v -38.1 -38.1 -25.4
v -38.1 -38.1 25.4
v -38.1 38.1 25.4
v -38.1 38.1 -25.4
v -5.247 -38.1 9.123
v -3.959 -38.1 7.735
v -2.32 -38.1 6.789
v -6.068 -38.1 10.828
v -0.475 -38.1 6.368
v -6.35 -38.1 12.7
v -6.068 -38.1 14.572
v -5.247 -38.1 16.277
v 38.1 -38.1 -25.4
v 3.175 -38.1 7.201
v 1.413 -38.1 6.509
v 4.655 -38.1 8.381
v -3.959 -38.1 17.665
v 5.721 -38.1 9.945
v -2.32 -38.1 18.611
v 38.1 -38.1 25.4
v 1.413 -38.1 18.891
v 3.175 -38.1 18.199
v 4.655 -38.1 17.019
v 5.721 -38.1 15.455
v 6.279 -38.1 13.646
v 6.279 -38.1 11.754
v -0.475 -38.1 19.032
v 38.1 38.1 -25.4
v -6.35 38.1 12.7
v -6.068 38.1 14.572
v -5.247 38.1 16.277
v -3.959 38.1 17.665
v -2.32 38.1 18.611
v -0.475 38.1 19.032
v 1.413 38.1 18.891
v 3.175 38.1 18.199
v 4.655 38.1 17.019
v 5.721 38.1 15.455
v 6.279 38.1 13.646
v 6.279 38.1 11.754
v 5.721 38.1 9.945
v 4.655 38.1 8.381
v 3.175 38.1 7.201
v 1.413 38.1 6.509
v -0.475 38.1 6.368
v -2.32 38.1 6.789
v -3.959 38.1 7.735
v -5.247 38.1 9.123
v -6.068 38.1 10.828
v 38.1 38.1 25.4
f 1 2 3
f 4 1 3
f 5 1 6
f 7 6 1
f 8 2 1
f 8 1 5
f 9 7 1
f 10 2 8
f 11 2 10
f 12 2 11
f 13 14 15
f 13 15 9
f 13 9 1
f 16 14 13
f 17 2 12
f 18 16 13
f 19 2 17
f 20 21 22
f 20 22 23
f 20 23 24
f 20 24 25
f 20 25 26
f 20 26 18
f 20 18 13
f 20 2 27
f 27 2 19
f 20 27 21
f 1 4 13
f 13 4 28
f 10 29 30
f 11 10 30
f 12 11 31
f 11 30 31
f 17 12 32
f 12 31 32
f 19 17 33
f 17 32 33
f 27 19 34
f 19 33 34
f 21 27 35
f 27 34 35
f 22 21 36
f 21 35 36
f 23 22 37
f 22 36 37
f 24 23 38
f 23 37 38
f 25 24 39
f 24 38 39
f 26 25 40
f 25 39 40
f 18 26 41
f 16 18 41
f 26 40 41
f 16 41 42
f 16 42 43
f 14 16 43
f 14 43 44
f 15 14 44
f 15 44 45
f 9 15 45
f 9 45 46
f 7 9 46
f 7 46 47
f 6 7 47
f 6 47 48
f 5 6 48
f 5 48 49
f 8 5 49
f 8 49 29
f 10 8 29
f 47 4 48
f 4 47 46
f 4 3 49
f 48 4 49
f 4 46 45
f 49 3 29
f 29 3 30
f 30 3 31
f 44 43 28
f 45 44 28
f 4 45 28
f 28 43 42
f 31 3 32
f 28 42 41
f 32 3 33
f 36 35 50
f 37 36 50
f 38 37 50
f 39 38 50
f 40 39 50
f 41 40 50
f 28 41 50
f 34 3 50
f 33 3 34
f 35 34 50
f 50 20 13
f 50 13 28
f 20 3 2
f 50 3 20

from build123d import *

# Parameters (mm, degrees)
F0_W     = 76.2
F0_H     = 76.2
F1_DEPTH = 25.4
F2_R     = 6.35
F3_DEPTH = 76.201


with BuildPart() as f1:
    # F0 (on Top) → F1 (new body, symmetric)
    with BuildSketch(Plane.XY):
        Rectangle(F0_W, F0_H)
    extrude(amount=F1_DEPTH, both=True)

    # F2 (on face) → F3 (cut, through all)
    with BuildSketch(Plane(origin=(0, 38.1, 0), x_dir=(-1, 0, 0), z_dir=(0, 1, 0))):
        with Locations((0, 12.7)):
            Circle(F2_R)
    extrude(amount=-F3_DEPTH, mode=Mode.SUBTRACT)


solid = f1.part
